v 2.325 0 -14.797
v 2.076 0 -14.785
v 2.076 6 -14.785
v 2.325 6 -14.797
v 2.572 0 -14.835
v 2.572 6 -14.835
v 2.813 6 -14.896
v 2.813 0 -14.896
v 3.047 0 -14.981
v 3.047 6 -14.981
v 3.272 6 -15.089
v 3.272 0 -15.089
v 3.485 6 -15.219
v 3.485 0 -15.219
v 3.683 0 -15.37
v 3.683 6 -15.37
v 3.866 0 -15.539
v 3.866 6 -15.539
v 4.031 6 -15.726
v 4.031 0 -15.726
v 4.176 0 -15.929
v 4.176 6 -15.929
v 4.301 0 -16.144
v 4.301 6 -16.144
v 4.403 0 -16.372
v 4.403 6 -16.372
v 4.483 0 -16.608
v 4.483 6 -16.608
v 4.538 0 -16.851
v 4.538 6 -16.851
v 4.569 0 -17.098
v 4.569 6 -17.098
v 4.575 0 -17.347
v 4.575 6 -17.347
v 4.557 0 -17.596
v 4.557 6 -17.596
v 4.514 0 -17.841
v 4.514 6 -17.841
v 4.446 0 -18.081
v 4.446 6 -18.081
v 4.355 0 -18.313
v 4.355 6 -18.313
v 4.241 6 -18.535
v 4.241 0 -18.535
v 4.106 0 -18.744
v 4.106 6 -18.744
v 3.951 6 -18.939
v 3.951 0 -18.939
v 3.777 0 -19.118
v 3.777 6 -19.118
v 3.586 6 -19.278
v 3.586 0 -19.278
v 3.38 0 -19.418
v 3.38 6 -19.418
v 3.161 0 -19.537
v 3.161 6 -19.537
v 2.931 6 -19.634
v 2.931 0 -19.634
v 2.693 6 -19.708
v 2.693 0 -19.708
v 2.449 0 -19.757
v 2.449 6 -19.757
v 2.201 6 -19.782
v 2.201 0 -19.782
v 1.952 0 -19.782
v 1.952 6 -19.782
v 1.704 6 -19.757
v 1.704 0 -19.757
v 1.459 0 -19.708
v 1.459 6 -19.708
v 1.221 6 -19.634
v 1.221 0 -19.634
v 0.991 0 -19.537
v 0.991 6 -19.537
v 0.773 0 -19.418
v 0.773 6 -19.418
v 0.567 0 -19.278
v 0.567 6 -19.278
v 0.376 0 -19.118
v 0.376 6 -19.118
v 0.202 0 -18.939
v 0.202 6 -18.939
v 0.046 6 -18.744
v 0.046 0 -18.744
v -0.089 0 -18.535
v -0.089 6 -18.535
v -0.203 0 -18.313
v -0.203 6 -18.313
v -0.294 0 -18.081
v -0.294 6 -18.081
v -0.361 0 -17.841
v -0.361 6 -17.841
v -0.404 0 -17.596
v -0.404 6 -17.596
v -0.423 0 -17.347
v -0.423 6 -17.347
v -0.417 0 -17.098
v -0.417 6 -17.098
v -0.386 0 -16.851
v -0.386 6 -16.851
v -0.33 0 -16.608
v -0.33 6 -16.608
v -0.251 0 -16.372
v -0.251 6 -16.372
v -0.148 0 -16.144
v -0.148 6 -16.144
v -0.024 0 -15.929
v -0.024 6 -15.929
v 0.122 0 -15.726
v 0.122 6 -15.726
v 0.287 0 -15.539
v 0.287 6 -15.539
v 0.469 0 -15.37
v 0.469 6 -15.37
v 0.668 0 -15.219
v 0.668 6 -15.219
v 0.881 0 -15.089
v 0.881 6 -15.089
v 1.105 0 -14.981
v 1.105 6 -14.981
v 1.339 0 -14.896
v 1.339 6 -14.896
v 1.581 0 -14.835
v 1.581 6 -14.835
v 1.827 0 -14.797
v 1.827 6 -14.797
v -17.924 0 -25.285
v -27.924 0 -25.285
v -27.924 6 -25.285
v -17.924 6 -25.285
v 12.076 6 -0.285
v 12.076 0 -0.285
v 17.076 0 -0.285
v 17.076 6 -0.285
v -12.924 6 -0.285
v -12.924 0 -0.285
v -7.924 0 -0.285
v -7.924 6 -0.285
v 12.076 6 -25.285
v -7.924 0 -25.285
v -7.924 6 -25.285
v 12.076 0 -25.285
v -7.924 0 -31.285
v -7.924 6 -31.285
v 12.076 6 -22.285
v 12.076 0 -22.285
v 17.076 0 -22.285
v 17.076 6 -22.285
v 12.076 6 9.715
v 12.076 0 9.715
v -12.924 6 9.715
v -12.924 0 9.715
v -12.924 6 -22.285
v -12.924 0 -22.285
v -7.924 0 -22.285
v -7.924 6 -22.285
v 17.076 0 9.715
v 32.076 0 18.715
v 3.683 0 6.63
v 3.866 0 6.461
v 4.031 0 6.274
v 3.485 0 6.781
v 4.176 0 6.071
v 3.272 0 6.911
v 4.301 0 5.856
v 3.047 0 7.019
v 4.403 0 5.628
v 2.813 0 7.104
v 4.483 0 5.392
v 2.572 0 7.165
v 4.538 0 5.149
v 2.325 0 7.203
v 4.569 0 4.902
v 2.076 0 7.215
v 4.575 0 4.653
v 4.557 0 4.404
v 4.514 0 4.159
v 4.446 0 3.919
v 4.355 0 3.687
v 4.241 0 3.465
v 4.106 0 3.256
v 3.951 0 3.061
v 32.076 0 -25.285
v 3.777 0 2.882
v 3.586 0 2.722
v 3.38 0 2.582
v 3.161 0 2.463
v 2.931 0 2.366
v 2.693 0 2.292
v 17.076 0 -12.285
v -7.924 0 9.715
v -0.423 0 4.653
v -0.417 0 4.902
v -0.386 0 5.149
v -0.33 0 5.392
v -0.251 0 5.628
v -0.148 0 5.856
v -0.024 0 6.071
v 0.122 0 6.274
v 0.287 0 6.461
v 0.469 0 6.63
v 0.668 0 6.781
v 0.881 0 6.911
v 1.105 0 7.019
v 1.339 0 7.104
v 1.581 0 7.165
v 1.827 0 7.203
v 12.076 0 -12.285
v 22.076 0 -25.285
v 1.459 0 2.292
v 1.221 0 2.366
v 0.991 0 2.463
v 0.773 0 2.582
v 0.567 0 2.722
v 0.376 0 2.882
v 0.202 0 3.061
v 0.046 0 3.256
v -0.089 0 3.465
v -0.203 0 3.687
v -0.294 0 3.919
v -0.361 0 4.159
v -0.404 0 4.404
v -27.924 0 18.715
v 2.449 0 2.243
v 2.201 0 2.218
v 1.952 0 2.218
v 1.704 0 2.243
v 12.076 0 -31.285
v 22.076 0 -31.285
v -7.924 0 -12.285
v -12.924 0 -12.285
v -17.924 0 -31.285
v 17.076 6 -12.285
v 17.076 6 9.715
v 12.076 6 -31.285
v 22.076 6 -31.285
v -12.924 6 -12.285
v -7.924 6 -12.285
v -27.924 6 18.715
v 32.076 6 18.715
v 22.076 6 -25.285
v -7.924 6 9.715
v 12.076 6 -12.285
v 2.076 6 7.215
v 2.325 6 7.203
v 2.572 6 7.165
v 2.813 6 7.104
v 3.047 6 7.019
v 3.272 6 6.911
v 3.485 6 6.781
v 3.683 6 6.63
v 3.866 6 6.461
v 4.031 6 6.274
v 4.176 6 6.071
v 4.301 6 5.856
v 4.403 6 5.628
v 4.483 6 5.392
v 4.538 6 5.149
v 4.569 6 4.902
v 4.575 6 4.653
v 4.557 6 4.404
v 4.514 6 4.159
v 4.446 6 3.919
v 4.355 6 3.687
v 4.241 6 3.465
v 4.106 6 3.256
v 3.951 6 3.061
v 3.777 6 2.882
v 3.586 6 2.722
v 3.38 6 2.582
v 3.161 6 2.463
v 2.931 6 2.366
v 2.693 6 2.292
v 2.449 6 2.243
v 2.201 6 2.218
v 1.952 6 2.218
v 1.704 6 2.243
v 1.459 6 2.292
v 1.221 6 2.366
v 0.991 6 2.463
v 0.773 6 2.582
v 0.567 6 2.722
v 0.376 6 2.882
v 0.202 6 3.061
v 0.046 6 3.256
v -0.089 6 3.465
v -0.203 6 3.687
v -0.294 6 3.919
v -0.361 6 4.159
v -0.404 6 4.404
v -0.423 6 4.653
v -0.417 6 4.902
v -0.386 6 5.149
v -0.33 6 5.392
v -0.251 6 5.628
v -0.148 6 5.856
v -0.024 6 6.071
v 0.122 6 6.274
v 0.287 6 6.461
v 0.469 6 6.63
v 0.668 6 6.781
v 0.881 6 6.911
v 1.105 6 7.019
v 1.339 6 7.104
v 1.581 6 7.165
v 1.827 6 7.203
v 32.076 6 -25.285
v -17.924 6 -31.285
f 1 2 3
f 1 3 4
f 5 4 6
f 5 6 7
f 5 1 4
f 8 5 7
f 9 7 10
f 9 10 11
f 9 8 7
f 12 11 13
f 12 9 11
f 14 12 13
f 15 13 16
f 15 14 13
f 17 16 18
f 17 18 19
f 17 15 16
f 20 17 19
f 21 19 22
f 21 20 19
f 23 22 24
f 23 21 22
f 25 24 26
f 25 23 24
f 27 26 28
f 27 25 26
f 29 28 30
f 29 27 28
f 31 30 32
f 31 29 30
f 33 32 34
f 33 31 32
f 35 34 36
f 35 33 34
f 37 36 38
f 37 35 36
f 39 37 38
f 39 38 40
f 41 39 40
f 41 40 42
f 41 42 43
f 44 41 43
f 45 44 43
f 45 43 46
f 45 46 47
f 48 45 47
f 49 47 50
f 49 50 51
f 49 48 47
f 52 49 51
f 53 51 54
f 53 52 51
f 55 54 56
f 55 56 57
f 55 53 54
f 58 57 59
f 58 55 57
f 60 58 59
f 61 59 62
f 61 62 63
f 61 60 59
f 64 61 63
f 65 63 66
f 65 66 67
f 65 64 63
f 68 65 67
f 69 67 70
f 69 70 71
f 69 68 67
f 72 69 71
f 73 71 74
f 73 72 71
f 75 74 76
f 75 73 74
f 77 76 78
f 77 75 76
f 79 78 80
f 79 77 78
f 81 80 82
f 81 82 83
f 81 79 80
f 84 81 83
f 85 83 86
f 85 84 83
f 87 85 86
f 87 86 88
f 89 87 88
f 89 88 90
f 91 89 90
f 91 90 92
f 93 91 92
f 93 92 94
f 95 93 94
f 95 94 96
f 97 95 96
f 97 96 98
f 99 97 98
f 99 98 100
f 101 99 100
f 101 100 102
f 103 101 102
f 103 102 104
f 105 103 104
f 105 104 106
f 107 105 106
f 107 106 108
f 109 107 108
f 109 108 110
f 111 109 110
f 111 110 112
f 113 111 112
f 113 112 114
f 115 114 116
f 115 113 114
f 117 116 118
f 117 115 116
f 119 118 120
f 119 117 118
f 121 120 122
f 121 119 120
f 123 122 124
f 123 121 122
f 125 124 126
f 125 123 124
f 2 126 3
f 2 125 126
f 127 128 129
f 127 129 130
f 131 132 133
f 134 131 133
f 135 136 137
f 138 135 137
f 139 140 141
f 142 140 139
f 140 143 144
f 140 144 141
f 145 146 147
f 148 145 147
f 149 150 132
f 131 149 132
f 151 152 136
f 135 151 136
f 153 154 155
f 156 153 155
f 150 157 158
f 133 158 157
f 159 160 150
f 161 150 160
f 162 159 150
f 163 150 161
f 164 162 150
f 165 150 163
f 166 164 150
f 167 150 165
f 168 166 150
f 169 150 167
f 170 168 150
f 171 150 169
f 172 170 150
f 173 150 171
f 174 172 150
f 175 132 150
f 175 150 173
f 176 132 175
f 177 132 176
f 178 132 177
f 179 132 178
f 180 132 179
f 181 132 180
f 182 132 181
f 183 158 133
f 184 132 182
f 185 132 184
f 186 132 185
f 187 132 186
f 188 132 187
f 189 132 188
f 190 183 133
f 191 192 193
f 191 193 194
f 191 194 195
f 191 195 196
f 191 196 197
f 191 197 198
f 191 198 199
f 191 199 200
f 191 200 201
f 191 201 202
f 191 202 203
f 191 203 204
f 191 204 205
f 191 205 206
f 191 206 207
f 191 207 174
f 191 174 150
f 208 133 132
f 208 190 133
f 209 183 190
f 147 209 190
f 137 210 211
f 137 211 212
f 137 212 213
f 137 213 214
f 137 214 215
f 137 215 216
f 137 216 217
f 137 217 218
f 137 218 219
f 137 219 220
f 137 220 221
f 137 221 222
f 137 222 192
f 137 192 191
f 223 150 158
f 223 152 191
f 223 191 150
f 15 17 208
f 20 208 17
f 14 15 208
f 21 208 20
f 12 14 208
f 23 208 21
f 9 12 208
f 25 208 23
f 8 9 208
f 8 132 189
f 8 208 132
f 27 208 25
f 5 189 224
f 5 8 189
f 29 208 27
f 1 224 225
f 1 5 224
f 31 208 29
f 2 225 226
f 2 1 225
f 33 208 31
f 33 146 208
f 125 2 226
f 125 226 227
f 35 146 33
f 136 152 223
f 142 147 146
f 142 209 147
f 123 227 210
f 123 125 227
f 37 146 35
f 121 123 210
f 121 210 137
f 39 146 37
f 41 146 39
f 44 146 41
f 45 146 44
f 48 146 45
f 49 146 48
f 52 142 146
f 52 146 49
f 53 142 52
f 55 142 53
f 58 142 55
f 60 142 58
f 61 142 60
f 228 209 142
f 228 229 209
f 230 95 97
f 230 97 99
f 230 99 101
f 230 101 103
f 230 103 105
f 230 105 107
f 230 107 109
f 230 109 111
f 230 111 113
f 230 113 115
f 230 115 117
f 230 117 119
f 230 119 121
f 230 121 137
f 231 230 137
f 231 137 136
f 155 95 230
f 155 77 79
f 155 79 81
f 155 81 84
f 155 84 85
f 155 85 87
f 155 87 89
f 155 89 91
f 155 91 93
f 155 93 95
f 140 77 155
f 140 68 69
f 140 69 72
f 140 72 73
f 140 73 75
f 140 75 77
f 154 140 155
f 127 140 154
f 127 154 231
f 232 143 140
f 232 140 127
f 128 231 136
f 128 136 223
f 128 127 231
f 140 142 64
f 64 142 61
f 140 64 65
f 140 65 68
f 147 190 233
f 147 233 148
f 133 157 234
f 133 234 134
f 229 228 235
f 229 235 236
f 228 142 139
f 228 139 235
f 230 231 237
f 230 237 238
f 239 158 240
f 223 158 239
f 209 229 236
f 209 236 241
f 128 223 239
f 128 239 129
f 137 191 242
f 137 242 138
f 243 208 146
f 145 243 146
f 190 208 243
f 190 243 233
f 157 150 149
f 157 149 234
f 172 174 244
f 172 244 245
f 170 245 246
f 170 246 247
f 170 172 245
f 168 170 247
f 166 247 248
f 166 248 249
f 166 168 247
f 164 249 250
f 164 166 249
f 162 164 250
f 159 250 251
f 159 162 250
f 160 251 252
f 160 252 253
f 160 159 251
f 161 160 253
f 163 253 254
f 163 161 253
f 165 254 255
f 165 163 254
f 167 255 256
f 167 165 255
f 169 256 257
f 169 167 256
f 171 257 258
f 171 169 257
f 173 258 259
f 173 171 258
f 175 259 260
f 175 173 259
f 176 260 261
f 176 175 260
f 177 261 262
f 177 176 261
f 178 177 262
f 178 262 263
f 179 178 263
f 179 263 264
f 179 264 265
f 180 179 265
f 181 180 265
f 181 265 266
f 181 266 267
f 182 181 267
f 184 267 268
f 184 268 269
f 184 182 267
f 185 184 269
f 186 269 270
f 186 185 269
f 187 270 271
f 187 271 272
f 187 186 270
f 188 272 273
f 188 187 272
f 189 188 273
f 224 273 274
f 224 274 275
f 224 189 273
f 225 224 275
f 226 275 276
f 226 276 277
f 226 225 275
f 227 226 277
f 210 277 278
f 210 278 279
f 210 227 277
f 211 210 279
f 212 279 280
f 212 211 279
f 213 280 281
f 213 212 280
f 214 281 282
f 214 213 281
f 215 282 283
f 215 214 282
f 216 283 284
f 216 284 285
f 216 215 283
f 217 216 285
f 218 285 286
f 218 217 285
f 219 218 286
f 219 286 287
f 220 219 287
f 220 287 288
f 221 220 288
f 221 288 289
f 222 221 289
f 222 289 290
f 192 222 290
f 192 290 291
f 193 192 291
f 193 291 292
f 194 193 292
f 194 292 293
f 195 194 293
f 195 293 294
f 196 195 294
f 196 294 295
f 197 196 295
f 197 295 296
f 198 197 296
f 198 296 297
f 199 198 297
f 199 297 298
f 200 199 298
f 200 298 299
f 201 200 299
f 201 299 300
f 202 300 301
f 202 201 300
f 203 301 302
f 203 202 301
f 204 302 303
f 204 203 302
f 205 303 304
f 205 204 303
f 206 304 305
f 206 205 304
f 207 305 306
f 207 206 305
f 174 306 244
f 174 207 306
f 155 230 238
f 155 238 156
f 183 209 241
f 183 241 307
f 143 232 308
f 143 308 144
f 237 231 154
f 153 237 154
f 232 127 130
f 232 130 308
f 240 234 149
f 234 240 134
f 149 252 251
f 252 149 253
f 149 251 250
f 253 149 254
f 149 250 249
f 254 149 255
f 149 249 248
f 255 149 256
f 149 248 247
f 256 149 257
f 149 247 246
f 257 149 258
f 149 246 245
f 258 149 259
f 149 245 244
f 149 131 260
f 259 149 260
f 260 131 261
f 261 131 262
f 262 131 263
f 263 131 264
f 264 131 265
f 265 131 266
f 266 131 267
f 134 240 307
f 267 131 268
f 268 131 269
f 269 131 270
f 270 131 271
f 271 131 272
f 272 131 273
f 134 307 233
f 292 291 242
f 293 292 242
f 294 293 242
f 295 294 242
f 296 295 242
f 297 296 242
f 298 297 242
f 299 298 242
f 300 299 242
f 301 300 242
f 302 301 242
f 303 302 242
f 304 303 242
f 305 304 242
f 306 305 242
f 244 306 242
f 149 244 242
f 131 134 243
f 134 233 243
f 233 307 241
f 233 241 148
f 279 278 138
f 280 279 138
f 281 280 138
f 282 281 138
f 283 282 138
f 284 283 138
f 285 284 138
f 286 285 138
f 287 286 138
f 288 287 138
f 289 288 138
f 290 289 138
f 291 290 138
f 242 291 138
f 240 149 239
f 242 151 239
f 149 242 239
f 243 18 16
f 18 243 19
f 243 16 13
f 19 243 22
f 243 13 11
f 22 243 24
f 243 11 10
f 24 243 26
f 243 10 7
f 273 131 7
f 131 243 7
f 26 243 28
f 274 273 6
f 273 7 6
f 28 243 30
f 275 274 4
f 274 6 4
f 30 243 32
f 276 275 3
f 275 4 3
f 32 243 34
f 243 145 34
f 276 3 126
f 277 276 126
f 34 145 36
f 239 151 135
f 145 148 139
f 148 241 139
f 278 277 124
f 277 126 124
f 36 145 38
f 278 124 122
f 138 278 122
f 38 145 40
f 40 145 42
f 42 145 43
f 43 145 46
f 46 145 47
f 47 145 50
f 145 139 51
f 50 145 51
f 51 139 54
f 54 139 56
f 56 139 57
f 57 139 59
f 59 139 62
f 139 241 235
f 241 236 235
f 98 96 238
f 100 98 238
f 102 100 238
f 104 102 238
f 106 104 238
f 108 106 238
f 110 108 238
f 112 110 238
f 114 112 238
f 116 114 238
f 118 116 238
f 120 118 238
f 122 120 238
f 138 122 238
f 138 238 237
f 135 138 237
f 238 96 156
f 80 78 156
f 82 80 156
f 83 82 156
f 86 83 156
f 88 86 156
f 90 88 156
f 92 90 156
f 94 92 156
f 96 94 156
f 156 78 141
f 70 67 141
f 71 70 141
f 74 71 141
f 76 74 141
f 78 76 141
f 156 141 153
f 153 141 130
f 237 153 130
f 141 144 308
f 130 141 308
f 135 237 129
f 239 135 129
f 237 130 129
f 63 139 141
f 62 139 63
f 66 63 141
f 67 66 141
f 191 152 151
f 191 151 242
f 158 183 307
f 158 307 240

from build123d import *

# Parameters (mm, degrees)
SKETCH2_R           = 2.5
SKETCH2_W           = 5
SKETCH2_H           = 10
BOSS_EXTRUDE1_DEPTH = 6


with BuildPart() as part:
    # Sketch2 → Boss-Extrude1 (new body)
    with BuildSketch(Plane(origin=(0, 0, 0), x_dir=(1, 0, 0), z_dir=(0, 1, 0))):
        Polygon((-27.923792882, 25.284964835), (-17.923792882, 25.284964835), (-17.923792882, 31.284964835), (-7.923792882, 31.284964835), (-7.923792882, 25.284964835), (12.076207118, 25.284964835), (12.076207118, 31.284964835), (22.076207118, 31.284964835), (22.076207118, 25.284964835), (32.076207118, 25.284964835), (32.076207118, -18.715035165), (-27.923792882, -18.715035165), align=None)
        with Locations(Location((2.076207118, 17.284964835, 0), (0, 0, 270))):
            Circle(SKETCH2_R, mode=Mode.SUBTRACT)
        with Locations(Location((2.076207118, -4.715035165, 0), (0, 0, 270))):
            Circle(SKETCH2_R, mode=Mode.SUBTRACT)
        with Locations((-10.423792882, -4.715035165)):
            Rectangle(SKETCH2_W, SKETCH2_H, mode=Mode.SUBTRACT)
        with Locations((-10.423792882, 17.284964835)):
            Rectangle(SKETCH2_W, SKETCH2_H, mode=Mode.SUBTRACT)
        with Locations((14.576207118, 17.284964835)):
            Rectangle(SKETCH2_W, SKETCH2_H, mode=Mode.SUBTRACT)
        with Locations((14.576207118, -4.715035165)):
            Rectangle(SKETCH2_W, SKETCH2_H, mode=Mode.SUBTRACT)
    extrude(amount=BOSS_EXTRUDE1_DEPTH)


solid = part.part
